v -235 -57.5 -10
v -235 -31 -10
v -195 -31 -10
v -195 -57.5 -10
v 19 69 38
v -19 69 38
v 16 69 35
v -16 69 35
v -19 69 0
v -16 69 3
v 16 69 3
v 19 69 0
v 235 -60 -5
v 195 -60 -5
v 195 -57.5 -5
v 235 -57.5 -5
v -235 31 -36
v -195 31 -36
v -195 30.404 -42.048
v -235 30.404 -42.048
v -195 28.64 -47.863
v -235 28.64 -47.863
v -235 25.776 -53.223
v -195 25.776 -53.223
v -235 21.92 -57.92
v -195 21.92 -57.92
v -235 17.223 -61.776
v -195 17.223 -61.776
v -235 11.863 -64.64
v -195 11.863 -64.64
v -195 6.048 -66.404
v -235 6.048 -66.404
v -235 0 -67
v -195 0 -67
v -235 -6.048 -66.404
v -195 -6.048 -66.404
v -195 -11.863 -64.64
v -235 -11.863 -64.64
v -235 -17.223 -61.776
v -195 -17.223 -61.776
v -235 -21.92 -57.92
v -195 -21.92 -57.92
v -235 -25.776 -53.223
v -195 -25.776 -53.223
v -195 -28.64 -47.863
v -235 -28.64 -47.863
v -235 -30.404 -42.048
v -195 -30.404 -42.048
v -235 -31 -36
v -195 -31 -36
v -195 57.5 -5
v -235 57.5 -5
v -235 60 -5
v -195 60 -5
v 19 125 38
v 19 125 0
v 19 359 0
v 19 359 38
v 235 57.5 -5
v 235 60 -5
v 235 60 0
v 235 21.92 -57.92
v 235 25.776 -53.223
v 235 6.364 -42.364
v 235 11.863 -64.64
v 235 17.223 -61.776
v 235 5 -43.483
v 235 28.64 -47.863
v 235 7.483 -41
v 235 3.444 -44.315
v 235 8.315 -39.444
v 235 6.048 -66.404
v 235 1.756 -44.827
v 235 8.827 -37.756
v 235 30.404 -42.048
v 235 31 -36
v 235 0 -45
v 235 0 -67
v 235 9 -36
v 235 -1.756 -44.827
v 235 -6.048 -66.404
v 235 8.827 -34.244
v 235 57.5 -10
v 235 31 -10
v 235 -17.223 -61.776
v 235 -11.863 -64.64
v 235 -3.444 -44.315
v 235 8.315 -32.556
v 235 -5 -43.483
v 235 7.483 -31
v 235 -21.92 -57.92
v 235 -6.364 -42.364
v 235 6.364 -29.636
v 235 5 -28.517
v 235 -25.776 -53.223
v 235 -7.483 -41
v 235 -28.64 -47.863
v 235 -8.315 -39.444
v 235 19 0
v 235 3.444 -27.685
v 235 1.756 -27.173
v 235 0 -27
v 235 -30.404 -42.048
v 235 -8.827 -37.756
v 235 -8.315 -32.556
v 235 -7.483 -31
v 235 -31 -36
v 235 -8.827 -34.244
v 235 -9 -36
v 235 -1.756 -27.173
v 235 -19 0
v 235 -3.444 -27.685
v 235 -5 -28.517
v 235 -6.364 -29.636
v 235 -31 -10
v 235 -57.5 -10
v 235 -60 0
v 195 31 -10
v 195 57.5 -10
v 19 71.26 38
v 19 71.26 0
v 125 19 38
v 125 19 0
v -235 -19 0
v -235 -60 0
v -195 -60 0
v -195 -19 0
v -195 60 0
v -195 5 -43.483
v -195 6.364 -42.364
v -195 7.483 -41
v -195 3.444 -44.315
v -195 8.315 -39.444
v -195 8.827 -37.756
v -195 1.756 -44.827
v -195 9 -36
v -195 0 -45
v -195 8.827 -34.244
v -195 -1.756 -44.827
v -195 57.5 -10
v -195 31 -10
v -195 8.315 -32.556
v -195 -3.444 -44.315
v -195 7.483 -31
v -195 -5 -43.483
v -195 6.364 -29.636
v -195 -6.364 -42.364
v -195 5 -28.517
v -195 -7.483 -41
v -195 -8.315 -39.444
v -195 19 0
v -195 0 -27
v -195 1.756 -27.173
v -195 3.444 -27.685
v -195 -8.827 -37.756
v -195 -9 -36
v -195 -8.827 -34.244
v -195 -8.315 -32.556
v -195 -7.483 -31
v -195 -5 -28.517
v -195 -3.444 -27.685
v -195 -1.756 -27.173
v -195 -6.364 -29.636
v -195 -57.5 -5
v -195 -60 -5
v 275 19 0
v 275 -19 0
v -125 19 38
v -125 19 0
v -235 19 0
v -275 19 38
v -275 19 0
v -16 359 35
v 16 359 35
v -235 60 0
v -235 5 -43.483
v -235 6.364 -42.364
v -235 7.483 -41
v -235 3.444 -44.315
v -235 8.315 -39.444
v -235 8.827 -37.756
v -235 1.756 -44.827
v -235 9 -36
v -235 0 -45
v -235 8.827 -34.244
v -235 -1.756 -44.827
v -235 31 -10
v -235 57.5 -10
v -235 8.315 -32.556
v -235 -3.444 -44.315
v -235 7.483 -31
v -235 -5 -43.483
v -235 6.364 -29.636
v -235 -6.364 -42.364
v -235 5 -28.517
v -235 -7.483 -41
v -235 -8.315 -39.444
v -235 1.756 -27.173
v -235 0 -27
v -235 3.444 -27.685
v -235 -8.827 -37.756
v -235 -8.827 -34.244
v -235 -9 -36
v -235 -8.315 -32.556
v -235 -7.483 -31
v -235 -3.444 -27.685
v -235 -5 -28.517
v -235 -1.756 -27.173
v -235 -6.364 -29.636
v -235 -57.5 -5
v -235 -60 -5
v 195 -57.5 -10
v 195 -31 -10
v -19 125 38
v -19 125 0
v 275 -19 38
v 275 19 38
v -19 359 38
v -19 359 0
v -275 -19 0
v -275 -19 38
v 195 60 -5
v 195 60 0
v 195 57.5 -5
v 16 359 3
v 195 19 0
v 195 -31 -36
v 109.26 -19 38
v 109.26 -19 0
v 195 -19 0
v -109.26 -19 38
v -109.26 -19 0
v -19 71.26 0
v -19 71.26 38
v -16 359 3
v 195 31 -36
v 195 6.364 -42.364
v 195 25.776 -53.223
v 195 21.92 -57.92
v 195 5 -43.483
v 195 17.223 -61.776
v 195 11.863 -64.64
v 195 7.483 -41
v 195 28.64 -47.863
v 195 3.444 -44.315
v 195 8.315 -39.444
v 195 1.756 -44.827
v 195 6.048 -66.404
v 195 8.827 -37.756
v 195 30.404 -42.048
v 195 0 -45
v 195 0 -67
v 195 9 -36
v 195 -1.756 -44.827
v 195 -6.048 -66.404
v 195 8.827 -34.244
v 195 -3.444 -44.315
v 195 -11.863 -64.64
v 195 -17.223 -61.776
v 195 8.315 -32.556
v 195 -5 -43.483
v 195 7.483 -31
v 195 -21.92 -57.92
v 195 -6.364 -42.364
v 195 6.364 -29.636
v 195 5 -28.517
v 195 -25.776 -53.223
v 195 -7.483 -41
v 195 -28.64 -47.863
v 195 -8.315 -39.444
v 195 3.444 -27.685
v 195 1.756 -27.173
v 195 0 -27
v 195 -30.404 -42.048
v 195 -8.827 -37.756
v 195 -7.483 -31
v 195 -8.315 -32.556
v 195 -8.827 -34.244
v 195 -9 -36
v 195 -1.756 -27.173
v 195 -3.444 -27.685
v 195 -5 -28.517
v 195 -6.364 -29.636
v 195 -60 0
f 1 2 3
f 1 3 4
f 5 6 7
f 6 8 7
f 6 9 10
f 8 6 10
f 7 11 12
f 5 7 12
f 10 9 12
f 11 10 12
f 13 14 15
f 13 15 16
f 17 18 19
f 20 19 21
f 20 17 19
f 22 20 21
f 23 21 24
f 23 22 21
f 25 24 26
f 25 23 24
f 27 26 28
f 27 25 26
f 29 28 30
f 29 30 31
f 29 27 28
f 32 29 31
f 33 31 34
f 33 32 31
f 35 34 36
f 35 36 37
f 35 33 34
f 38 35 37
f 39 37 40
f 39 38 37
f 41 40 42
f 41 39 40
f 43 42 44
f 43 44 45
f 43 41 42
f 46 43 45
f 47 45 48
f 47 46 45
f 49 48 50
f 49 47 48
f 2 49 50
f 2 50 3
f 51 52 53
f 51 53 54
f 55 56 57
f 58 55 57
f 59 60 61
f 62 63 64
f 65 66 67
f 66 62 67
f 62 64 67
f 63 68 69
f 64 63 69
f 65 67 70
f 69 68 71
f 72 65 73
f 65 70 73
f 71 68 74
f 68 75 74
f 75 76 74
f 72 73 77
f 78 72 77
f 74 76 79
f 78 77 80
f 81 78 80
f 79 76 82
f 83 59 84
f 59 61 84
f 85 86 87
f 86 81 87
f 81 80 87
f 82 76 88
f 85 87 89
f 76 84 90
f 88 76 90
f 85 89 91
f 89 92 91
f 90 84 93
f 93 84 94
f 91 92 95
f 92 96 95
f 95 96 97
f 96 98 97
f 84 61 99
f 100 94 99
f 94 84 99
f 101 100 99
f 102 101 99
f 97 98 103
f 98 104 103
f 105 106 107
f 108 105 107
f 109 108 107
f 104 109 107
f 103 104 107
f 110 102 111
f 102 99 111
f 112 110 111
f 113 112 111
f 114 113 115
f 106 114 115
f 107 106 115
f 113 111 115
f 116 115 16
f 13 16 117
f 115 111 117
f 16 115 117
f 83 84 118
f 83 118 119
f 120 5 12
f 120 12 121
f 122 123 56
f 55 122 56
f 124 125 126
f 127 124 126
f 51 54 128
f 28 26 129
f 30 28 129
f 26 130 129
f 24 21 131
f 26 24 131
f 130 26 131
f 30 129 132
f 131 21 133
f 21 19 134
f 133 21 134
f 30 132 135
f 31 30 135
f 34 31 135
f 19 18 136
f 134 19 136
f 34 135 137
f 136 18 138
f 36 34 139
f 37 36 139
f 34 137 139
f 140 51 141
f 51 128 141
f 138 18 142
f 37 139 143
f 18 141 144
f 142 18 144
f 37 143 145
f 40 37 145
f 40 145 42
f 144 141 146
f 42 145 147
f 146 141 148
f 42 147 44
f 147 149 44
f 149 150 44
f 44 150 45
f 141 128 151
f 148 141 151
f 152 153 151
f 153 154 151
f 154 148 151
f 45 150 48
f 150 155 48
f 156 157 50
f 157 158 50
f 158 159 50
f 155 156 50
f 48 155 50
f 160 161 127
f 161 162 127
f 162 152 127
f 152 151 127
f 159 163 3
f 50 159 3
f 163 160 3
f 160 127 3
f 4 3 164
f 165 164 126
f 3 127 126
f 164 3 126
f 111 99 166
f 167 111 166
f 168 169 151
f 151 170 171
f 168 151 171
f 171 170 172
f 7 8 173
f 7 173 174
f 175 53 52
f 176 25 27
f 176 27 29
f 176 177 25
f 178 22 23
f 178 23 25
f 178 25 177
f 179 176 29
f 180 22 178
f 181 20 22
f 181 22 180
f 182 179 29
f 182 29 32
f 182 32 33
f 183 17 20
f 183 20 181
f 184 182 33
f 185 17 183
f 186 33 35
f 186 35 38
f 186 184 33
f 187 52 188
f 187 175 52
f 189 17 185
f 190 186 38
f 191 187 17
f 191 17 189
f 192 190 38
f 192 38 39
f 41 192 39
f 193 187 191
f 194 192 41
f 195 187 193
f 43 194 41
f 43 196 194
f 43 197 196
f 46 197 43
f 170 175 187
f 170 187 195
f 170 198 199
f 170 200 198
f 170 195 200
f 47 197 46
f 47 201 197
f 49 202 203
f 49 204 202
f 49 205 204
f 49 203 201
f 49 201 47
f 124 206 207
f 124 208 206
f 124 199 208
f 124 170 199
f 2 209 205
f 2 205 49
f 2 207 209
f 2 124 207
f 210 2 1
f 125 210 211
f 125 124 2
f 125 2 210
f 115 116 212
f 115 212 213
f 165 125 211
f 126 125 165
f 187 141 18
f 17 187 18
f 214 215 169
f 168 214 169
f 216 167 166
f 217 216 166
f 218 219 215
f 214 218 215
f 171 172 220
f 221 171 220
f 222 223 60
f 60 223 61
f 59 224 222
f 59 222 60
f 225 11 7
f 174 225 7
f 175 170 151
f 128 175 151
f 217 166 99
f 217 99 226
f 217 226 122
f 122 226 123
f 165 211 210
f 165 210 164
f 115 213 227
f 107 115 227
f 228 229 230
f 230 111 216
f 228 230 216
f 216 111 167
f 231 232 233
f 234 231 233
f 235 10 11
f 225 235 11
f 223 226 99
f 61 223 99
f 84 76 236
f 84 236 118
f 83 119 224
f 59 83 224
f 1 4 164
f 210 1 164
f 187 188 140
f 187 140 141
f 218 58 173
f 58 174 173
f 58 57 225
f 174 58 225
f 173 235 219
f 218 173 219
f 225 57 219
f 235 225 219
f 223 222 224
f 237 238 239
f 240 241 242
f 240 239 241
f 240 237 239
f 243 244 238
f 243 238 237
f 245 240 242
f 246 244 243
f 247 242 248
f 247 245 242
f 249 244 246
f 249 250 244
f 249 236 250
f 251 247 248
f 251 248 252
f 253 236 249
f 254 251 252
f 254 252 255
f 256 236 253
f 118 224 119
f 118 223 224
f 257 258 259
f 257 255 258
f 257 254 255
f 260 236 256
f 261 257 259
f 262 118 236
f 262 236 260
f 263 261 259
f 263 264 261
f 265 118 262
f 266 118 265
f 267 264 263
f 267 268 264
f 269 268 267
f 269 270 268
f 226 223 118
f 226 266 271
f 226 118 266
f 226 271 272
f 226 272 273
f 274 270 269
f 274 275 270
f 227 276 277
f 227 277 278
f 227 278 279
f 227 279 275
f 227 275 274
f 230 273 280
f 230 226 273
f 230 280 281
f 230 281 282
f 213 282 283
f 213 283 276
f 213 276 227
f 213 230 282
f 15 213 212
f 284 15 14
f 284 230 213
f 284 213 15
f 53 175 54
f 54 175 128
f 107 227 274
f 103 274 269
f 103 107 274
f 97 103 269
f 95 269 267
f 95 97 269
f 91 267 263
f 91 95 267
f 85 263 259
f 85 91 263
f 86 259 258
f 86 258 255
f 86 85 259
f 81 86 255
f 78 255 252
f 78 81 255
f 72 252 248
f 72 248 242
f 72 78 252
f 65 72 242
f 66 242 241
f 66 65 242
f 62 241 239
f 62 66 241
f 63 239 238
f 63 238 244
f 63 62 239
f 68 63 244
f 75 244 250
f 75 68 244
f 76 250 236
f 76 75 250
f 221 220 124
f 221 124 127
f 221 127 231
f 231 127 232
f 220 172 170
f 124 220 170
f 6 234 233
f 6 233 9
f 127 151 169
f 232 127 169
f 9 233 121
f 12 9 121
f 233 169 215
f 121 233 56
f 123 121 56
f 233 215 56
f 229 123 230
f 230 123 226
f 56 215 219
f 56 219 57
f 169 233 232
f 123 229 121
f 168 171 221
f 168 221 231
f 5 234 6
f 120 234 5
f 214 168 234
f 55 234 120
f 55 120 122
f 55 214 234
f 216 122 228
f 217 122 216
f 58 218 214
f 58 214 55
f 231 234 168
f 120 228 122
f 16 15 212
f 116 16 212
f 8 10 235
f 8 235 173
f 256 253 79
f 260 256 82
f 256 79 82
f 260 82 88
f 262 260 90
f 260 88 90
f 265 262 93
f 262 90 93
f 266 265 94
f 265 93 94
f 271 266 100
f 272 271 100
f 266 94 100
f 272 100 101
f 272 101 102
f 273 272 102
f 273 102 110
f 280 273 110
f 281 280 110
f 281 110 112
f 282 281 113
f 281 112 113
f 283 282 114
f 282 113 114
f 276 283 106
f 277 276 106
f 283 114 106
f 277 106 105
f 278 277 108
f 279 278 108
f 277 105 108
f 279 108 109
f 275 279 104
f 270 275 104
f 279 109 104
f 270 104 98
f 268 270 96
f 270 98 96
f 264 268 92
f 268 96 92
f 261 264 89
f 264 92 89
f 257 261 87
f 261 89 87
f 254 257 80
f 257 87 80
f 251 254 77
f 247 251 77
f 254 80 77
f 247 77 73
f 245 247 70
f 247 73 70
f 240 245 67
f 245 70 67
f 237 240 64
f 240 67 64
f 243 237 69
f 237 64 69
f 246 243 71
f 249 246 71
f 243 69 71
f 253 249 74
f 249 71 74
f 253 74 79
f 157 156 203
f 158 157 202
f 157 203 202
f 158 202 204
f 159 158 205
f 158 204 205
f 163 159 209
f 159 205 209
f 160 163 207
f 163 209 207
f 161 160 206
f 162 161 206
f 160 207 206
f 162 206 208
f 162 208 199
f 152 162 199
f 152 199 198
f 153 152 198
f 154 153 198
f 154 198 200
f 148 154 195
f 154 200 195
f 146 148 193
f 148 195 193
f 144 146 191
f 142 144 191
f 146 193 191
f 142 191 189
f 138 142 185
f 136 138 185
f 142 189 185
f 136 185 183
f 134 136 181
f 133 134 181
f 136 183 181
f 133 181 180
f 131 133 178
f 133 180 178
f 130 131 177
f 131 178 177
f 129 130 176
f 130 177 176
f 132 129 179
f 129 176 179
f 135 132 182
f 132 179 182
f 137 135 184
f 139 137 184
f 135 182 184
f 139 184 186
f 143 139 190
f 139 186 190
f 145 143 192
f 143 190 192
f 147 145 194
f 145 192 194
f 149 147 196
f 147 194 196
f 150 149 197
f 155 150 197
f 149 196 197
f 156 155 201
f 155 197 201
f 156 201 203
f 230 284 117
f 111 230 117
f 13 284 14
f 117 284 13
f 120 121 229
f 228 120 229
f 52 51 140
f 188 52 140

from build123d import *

# Parameters (mm, degrees)
F1_DEPTH = 38
F2_W     = 32
F2_H     = 32
F3_DEPTH = 290.001
F4_W     = 40
F4_H     = 120
F5_DEPTH = 5
F6_R     = 9
F7_DEPTH = 40
F8_R     = 9
F9_DEPTH = 40


with BuildPart() as f1:
    # F0 (on Top) → F1 (new body)
    with BuildSketch(Plane.XY):
        Polygon((-275, 19), (-275, -19), (-109.259885, -19), (-19, 71.259885), (-19, 69), (19, 69), (19, 71.259885), (109.259885, -19), (275, -19), (275, 19), (125, 19), (19, 125), (19, 359), (-19, 359), (-19, 125), (-125, 19), align=None)
    extrude(amount=F1_DEPTH)

    # F2 (on face) → F3 (cut, through all)
    with BuildSketch(Plane.XZ.offset(-69)):
        with Locations((0, 19)):
            Rectangle(F2_W, F2_H)
    extrude(amount=-F3_DEPTH, mode=Mode.SUBTRACT)

    # F4 (on face) → F5 (join)
    with BuildSketch(Plane(origin=(0, 0, 0), x_dir=(1, 0, 0), z_dir=(0, 0, -1))):
        with Locations((-215, 0)):
            Rectangle(F4_W, F4_H)
        with Locations((215, 0)):
            Rectangle(F4_W, F4_H)
    extrude(amount=F5_DEPTH)

    # F6 (on face) → F7 (join)
    with BuildSketch(Plane(origin=(-235, 0, 0), x_dir=(0, -1, 0), z_dir=(-1, 0, 0))):
        with BuildLine():
            Line((-31, -10), (-31, -36))
            ThreePointArc((-31, -36), (0, -67), (31, -36))
            Line((31, -36), (31, -10))
            Line((31, -10), (57.5, -10))
            Line((57.5, -10), (57.5, -5))
            Line((57.5, -5), (-57.5, -5))
            Line((-57.5, -5), (-57.5, -10))
            Line((-57.5, -10), (-31, -10))
        make_face()
        with Locations((0, -36)):
            Circle(F6_R, mode=Mode.SUBTRACT)
    extrude(amount=-F7_DEPTH)

    # F8 (on face) → F9 (join)
    with BuildSketch(Plane.YZ.offset(235)):
        with BuildLine():
            Line((-31, -10), (-31, -36))
            ThreePointArc((-31, -36), (0, -67), (31, -36))
            Line((31, -36), (31, -10))
            Line((31, -10), (57.5, -10))
            Line((57.5, -10), (57.5, -5))
            Line((57.5, -5), (-57.5, -5))
            Line((-57.5, -5), (-57.5, -10))
            Line((-57.5, -10), (-31, -10))
        make_face()
        with Locations((0, -36)):
            Circle(F8_R, mode=Mode.SUBTRACT)
    extrude(amount=-F9_DEPTH)


solid = f1.part
